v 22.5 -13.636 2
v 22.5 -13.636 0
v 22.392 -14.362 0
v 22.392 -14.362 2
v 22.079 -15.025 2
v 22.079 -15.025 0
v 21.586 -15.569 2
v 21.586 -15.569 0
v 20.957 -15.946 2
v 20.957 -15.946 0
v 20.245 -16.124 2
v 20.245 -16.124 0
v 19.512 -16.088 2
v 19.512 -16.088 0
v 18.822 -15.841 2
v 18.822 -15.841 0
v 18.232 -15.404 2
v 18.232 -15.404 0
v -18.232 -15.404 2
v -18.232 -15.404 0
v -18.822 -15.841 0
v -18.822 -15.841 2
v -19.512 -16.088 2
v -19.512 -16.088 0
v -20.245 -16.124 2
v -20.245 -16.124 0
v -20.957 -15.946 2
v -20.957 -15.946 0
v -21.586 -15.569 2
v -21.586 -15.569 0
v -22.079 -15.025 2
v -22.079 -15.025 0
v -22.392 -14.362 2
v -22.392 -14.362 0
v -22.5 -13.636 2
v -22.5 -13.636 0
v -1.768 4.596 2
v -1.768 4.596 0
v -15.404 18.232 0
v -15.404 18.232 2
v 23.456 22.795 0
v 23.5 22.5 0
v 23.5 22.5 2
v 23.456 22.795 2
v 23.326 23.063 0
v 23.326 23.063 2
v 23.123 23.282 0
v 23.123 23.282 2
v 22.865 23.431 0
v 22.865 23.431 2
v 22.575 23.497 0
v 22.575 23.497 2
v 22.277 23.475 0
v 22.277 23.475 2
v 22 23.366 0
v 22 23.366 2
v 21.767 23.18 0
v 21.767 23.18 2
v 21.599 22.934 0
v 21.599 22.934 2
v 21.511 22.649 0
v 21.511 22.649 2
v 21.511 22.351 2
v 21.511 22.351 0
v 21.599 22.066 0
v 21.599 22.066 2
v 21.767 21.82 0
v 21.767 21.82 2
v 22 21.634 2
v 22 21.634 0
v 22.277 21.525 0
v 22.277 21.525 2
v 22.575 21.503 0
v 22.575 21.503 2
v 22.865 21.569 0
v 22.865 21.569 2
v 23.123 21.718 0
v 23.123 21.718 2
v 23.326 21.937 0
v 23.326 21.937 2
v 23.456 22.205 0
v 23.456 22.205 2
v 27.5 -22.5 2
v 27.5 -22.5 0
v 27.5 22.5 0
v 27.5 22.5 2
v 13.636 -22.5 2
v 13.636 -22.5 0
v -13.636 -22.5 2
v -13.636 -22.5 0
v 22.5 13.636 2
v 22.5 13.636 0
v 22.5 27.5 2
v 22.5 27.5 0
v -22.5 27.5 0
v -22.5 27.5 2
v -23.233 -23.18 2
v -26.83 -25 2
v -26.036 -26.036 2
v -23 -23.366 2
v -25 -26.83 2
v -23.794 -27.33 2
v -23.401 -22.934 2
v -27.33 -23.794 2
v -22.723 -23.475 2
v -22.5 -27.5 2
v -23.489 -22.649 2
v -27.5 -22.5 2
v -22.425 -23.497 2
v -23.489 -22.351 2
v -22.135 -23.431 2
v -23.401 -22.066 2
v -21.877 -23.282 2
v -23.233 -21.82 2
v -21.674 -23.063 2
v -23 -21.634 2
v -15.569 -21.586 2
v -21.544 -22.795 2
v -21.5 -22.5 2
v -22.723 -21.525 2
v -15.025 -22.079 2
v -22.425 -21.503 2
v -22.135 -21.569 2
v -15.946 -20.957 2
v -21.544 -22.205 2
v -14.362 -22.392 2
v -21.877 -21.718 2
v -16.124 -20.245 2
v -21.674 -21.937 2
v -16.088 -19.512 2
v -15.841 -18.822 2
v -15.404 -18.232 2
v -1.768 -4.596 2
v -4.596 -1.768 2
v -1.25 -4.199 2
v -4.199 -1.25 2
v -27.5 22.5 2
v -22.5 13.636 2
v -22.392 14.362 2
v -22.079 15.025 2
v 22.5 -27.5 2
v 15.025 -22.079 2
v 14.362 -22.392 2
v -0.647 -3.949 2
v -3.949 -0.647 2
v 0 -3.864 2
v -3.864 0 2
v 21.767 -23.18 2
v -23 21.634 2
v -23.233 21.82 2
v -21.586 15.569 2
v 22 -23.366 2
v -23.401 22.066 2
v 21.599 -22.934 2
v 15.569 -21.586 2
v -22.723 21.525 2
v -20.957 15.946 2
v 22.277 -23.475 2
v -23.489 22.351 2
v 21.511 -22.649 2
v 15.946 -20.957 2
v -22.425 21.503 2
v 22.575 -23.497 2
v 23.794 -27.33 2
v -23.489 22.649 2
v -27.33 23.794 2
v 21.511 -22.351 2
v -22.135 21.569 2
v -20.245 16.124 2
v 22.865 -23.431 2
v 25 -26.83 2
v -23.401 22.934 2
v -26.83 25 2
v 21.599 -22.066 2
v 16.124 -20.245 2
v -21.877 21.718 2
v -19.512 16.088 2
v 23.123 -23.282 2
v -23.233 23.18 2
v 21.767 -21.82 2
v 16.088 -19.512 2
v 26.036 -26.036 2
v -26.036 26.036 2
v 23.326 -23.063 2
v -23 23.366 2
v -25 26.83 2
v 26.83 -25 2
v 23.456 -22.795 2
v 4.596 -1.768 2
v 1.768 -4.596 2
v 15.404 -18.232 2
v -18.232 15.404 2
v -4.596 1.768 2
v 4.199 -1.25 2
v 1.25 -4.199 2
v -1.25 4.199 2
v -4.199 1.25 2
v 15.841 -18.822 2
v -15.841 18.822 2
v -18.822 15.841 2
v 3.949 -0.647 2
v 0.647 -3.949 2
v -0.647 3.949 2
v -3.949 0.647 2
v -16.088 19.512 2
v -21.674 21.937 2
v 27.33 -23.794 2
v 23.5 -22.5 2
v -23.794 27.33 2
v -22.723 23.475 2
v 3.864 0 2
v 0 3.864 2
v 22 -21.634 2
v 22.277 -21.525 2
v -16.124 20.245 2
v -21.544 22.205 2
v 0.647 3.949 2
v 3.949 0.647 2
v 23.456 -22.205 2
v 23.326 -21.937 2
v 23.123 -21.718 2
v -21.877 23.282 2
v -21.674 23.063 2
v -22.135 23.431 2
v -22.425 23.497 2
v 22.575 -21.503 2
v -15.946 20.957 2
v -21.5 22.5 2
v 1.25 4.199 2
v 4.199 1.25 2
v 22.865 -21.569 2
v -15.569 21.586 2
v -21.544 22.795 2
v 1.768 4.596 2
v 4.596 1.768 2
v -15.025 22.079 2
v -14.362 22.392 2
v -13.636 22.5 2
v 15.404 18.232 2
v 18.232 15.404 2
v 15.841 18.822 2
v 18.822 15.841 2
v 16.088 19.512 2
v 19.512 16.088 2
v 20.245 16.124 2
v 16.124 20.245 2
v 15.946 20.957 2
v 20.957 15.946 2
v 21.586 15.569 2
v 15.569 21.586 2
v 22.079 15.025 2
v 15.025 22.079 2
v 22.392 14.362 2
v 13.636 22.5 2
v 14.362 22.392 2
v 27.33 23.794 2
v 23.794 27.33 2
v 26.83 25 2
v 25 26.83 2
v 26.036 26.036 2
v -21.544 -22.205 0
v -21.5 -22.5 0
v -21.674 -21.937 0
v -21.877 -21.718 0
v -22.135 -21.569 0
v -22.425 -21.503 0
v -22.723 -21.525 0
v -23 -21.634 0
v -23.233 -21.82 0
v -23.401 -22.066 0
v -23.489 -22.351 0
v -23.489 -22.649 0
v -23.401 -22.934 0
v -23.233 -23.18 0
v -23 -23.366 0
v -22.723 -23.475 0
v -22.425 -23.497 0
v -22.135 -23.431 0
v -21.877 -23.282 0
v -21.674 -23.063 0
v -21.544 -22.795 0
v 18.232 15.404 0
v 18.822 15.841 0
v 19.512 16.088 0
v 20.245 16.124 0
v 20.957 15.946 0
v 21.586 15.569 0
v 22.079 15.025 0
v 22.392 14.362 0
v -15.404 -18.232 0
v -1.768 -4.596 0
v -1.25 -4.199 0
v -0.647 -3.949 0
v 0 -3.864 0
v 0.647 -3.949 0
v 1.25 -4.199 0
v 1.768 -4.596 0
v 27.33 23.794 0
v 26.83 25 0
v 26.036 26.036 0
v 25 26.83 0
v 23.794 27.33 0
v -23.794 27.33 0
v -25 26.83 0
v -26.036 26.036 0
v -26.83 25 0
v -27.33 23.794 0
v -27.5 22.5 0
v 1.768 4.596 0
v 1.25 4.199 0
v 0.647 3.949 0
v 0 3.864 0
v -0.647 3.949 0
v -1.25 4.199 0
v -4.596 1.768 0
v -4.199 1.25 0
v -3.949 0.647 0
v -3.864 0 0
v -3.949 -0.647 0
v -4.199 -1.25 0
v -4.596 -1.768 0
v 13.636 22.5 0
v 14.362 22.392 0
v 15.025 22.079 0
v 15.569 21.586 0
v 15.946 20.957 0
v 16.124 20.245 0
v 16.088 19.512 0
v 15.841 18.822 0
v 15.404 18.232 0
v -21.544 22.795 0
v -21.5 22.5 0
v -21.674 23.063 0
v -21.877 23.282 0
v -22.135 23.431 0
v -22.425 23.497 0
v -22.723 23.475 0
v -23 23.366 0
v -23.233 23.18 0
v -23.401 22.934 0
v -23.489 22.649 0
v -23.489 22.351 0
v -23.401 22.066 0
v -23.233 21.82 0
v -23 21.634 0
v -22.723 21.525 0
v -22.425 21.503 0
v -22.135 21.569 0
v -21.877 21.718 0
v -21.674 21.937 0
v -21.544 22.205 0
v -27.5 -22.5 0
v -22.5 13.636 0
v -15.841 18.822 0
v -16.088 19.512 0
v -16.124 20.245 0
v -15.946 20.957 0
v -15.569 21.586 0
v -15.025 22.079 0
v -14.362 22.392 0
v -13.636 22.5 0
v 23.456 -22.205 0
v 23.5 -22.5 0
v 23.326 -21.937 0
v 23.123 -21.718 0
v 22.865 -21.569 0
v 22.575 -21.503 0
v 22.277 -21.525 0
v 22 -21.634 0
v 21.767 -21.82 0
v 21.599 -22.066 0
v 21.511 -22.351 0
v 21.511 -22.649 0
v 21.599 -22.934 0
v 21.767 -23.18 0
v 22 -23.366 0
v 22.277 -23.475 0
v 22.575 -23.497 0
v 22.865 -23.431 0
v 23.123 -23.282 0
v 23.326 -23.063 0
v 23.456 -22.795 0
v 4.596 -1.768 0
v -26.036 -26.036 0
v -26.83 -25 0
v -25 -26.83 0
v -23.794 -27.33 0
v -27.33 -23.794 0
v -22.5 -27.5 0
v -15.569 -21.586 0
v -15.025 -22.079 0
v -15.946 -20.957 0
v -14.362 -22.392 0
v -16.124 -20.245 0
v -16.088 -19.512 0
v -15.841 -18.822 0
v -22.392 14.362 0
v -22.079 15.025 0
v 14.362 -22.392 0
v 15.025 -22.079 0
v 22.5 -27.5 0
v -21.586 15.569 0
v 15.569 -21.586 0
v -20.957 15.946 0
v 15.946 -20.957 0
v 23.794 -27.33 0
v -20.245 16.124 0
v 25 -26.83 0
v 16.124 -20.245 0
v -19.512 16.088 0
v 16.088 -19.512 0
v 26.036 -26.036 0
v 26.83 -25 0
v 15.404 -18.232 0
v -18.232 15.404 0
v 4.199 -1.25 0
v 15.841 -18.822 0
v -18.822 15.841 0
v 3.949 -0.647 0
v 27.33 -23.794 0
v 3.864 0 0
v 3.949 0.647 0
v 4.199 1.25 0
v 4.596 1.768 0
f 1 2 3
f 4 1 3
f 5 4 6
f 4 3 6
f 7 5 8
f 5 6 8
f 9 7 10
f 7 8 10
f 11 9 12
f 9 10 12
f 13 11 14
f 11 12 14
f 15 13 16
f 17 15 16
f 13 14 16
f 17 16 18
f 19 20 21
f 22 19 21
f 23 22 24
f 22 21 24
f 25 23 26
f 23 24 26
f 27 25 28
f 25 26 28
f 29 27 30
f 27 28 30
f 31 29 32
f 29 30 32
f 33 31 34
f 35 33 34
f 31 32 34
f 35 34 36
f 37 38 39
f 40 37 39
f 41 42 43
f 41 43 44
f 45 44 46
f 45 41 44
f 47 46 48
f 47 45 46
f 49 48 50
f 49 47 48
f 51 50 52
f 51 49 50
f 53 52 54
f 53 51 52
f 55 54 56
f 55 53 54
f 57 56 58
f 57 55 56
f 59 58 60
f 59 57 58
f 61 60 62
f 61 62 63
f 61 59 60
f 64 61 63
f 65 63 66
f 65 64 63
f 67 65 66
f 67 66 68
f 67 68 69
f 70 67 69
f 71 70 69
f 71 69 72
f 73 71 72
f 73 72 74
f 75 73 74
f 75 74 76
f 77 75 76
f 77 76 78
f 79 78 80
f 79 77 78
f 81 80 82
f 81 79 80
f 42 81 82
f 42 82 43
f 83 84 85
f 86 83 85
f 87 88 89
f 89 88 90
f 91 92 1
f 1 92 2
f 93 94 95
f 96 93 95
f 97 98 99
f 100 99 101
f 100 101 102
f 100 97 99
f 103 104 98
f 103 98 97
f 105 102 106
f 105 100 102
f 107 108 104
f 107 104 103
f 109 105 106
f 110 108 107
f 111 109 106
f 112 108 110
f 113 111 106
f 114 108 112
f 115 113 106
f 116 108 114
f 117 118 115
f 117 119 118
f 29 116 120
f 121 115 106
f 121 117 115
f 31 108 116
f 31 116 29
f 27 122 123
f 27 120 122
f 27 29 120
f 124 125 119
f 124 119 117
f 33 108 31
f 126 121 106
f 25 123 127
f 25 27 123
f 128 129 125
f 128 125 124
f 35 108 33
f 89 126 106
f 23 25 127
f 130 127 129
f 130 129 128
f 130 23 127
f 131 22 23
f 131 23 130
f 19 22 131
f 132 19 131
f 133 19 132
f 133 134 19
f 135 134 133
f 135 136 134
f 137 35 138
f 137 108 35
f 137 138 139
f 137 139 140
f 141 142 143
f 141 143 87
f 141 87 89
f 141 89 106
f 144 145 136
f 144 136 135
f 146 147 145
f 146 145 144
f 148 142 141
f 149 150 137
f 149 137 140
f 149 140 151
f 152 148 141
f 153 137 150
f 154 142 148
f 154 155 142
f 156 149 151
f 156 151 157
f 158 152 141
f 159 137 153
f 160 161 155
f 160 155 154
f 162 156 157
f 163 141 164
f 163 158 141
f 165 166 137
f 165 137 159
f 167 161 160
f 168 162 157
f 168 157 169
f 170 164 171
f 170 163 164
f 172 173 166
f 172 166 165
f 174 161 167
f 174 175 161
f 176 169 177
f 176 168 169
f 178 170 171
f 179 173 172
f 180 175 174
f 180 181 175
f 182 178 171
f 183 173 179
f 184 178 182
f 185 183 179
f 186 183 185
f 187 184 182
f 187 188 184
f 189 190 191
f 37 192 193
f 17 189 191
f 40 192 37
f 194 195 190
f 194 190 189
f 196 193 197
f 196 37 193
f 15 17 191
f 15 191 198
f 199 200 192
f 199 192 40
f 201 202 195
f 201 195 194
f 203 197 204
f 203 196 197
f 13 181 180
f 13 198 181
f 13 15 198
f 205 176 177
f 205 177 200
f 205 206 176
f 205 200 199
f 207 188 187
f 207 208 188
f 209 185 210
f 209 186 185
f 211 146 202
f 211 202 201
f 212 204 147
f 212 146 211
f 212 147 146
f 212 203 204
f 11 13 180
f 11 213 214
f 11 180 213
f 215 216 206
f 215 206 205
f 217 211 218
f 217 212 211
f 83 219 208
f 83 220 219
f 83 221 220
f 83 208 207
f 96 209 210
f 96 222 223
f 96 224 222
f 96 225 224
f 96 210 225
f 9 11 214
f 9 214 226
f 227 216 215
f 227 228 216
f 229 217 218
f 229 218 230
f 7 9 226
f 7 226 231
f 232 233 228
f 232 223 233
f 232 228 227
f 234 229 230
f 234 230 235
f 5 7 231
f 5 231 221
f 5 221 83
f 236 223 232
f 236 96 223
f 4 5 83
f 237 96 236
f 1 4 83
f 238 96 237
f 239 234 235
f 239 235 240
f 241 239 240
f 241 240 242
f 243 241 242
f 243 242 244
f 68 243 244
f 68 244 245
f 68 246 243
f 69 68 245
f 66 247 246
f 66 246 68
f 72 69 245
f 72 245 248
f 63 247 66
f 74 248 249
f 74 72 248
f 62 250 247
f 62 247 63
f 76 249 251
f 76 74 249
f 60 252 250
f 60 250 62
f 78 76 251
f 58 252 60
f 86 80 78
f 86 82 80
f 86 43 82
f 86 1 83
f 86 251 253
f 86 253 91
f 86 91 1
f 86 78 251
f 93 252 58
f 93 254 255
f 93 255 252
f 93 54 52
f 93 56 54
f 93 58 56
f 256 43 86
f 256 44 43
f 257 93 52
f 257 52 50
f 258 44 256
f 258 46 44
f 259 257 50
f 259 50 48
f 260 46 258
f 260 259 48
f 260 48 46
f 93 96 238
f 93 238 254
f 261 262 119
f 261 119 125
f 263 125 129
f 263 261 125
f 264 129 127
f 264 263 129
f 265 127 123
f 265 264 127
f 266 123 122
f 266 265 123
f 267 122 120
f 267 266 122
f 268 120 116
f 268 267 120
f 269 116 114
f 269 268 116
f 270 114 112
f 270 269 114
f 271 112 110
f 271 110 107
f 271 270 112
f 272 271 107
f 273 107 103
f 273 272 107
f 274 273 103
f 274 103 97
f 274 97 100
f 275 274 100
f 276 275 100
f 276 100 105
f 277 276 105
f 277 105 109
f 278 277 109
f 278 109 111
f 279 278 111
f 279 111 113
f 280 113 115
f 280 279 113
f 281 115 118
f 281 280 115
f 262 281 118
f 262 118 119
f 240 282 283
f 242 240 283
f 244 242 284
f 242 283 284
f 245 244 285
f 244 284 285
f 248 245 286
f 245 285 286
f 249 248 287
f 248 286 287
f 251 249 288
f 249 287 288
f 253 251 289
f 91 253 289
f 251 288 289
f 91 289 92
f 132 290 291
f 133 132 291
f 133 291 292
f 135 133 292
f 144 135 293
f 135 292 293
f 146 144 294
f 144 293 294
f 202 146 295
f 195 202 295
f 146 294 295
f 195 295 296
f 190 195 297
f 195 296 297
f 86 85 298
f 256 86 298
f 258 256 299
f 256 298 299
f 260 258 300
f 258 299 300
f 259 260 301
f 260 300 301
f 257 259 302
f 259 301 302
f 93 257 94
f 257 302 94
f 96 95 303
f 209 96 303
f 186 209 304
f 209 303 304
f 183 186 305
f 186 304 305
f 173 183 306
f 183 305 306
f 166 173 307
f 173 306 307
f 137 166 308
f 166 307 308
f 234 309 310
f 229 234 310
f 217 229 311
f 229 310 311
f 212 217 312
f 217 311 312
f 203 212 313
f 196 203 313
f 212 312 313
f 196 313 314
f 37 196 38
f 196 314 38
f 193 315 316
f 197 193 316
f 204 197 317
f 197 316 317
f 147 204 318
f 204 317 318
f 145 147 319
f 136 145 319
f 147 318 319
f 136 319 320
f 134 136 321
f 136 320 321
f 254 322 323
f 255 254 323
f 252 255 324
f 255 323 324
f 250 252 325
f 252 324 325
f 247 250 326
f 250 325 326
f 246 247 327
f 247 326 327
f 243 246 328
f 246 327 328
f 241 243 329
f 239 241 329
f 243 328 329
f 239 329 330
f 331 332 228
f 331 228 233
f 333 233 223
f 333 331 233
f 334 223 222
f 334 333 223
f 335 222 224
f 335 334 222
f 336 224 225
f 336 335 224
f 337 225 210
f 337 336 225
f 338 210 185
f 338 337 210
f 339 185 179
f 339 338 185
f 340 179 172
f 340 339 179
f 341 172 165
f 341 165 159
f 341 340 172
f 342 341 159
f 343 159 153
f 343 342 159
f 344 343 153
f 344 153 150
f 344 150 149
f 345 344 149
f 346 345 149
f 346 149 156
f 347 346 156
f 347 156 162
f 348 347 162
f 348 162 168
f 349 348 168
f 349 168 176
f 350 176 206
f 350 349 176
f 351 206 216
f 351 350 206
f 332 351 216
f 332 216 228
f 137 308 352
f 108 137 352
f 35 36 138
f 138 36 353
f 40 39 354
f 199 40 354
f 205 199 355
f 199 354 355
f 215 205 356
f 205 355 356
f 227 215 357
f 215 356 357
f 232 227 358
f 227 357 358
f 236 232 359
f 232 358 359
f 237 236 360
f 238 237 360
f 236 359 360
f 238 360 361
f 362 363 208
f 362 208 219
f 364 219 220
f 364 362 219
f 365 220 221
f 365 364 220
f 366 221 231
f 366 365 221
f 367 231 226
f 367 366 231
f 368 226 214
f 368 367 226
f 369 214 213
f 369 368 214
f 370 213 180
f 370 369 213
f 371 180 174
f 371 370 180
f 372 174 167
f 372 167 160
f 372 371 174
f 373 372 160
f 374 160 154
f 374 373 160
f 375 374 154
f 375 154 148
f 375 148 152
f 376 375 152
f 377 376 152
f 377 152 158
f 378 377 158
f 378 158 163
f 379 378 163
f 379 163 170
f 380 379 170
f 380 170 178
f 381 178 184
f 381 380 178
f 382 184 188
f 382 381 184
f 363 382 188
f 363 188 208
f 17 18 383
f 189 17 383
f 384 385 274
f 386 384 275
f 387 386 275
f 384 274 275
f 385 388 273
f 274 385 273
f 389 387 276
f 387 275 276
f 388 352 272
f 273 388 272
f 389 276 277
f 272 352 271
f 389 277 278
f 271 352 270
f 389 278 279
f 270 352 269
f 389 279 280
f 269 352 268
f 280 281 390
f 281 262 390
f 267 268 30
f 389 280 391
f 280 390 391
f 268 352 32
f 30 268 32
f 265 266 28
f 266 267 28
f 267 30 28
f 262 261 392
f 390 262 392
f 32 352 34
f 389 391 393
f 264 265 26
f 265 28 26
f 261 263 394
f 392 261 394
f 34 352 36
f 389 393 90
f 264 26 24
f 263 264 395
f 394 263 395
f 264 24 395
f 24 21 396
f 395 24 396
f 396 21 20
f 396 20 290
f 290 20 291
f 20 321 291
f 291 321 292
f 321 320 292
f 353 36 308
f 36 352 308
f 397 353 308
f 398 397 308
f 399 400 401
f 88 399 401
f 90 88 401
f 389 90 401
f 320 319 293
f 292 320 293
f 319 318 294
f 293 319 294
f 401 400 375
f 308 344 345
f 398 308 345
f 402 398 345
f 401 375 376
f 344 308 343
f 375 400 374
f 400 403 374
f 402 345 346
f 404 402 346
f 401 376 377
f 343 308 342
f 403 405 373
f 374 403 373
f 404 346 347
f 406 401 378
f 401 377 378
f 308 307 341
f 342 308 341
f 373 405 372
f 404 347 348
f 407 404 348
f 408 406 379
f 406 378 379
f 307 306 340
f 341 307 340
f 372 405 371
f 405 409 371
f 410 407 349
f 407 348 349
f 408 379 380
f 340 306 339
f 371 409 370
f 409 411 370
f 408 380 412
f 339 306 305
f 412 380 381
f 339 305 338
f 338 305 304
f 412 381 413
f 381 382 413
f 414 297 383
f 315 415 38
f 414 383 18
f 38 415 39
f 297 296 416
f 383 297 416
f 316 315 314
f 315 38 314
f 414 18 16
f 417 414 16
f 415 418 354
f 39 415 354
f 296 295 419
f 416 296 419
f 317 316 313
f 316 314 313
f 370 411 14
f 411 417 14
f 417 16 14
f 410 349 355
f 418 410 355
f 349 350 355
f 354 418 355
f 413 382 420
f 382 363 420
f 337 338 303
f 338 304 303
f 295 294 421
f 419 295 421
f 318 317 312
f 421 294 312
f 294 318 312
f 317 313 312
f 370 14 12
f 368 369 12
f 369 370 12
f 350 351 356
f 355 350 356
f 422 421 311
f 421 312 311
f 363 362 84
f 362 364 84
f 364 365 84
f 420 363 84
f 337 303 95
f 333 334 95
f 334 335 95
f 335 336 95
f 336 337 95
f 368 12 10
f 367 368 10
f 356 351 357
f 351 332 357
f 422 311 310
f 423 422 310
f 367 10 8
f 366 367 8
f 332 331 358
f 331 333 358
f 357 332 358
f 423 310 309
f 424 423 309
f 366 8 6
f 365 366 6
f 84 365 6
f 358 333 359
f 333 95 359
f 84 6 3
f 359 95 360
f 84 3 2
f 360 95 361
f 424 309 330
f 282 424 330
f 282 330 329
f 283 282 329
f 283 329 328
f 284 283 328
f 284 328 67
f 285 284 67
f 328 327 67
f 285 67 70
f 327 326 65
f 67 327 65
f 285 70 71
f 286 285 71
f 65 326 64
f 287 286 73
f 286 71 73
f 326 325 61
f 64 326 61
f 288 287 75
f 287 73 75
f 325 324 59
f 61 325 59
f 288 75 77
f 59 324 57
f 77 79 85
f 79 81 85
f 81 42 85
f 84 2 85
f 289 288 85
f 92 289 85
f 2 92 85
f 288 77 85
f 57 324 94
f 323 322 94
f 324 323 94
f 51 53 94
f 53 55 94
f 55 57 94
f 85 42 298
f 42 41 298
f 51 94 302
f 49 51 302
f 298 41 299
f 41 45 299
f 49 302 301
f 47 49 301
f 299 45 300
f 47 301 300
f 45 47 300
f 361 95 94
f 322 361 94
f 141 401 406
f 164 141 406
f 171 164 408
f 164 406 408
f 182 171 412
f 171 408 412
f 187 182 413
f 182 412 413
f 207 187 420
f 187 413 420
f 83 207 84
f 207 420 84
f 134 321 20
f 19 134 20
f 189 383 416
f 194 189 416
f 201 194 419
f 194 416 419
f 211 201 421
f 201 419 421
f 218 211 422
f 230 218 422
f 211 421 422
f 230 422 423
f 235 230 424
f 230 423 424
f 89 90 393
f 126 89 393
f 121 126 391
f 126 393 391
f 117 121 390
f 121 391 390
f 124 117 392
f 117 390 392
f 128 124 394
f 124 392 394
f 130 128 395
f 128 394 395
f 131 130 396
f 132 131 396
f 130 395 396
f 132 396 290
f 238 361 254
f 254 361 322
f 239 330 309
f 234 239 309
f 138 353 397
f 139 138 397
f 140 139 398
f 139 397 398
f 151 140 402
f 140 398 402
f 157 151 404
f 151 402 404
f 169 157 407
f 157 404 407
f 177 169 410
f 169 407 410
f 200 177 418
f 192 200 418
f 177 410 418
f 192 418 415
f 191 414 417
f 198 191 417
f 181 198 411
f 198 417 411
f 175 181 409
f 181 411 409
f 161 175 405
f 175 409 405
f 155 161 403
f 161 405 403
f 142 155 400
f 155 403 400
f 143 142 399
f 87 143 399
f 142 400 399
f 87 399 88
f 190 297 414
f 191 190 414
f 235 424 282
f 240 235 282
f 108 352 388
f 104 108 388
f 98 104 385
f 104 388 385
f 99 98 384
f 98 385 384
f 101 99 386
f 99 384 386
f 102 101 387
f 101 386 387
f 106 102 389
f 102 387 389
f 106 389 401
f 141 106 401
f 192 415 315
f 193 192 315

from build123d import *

# Parameters (mm, degrees)
SKETCH1_R           = 1
BOSS_EXTRUDE1_DEPTH = 2


with BuildPart() as part:
    # Sketch1 → Boss-Extrude1 (new body)
    with BuildSketch(Plane.XY):
        with BuildLine():
            Line((22.5, 27.5), (-22.5, 27.5))
            ThreePointArc((-22.5, 27.5), (-26.035533906, 26.035533906), (-27.5, 22.5))
            Line((-27.5, 22.5), (-27.5, -22.5))
            ThreePointArc((-27.5, -22.5), (-26.035533906, -26.035533906), (-22.5, -27.5))
            Line((-22.5, -27.5), (22.5, -27.5))
            ThreePointArc((22.5, -27.5), (26.035533906, -26.035533906), (27.5, -22.5))
            Line((27.5, -22.5), (27.5, 22.5))
            ThreePointArc((27.5, 22.5), (26.035533906, 26.035533906), (22.5, 27.5))
        make_face()
        with Locations((-22.5, 22.5)):
            Circle(SKETCH1_R, mode=Mode.SUBTRACT)
        with Locations((22.5, 22.5)):
            Circle(SKETCH1_R, mode=Mode.SUBTRACT)
        with Locations((22.5, -22.5)):
            Circle(SKETCH1_R, mode=Mode.SUBTRACT)
        with Locations((-22.5, -22.5)):
            Circle(SKETCH1_R, mode=Mode.SUBTRACT)
        with BuildLine():
            Line((-13.636038969, 22.5), (13.636038969, 22.5))
            ThreePointArc((13.636038969, 22.5), (15.945737801, 20.956708581), (15.403805922, 18.232233047))
            Line((15.403805922, 18.232233047), (1.767766953, 4.596194078))
            ThreePointArc((1.767766953, 4.596194078), (0, 3.863961031), (-1.767766953, 4.596194078))
            Line((-1.767766953, 4.596194078), (-15.403805922, 18.232233047))
            ThreePointArc((-15.403805922, 18.232233047), (-15.945737801, 20.956708581), (-13.636038969, 22.5))
        make_face(mode=Mode.SUBTRACT)
        with BuildLine():
            Line((-18.232233047, 15.403805922), (-4.596194078, 1.767766953))
            ThreePointArc((-4.596194078, 1.767766953), (-3.863961031, 0), (-4.596194078, -1.767766953))
            Line((-4.596194078, -1.767766953), (-18.232233047, -15.403805922))
            ThreePointArc((-18.232233047, -15.403805922), (-20.956708581, -15.945737801), (-22.5, -13.636038969))
            Line((-22.5, -13.636038969), (-22.5, 13.636038969))
            ThreePointArc((-22.5, 13.636038969), (-20.956708581, 15.945737801), (-18.232233047, 15.403805922))
        make_face(mode=Mode.SUBTRACT)
        with BuildLine():
            Line((-15.403805922, -18.232233047), (-1.767766953, -4.596194078))
            ThreePointArc((-1.767766953, -4.596194078), (0, -3.863961031), (1.767766953, -4.596194078))
            Line((1.767766953, -4.596194078), (15.403805922, -18.232233047))
            ThreePointArc((15.403805922, -18.232233047), (15.945737801, -20.956708581), (13.636038969, -22.5))
            Line((13.636038969, -22.5), (-13.636038969, -22.5))
            ThreePointArc((-13.636038969, -22.5), (-15.945737801, -20.956708581), (-15.403805922, -18.232233047))
        make_face(mode=Mode.SUBTRACT)
        with BuildLine():
            Line((18.232233047, -15.403805922), (4.596194078, -1.767766953))
            ThreePointArc((4.596194078, -1.767766953), (3.863961031, 0), (4.596194078, 1.767766953))
            Line((4.596194078, 1.767766953), (18.232233047, 15.403805922))
            ThreePointArc((18.232233047, 15.403805922), (20.956708581, 15.945737801), (22.5, 13.636038969))
            Line((22.5, 13.636038969), (22.5, -13.636038969))
            ThreePointArc((22.5, -13.636038969), (20.956708581, -15.945737801), (18.232233047, -15.403805922))
        make_face(mode=Mode.SUBTRACT)
    extrude(amount=BOSS_EXTRUDE1_DEPTH)


solid = part.part
